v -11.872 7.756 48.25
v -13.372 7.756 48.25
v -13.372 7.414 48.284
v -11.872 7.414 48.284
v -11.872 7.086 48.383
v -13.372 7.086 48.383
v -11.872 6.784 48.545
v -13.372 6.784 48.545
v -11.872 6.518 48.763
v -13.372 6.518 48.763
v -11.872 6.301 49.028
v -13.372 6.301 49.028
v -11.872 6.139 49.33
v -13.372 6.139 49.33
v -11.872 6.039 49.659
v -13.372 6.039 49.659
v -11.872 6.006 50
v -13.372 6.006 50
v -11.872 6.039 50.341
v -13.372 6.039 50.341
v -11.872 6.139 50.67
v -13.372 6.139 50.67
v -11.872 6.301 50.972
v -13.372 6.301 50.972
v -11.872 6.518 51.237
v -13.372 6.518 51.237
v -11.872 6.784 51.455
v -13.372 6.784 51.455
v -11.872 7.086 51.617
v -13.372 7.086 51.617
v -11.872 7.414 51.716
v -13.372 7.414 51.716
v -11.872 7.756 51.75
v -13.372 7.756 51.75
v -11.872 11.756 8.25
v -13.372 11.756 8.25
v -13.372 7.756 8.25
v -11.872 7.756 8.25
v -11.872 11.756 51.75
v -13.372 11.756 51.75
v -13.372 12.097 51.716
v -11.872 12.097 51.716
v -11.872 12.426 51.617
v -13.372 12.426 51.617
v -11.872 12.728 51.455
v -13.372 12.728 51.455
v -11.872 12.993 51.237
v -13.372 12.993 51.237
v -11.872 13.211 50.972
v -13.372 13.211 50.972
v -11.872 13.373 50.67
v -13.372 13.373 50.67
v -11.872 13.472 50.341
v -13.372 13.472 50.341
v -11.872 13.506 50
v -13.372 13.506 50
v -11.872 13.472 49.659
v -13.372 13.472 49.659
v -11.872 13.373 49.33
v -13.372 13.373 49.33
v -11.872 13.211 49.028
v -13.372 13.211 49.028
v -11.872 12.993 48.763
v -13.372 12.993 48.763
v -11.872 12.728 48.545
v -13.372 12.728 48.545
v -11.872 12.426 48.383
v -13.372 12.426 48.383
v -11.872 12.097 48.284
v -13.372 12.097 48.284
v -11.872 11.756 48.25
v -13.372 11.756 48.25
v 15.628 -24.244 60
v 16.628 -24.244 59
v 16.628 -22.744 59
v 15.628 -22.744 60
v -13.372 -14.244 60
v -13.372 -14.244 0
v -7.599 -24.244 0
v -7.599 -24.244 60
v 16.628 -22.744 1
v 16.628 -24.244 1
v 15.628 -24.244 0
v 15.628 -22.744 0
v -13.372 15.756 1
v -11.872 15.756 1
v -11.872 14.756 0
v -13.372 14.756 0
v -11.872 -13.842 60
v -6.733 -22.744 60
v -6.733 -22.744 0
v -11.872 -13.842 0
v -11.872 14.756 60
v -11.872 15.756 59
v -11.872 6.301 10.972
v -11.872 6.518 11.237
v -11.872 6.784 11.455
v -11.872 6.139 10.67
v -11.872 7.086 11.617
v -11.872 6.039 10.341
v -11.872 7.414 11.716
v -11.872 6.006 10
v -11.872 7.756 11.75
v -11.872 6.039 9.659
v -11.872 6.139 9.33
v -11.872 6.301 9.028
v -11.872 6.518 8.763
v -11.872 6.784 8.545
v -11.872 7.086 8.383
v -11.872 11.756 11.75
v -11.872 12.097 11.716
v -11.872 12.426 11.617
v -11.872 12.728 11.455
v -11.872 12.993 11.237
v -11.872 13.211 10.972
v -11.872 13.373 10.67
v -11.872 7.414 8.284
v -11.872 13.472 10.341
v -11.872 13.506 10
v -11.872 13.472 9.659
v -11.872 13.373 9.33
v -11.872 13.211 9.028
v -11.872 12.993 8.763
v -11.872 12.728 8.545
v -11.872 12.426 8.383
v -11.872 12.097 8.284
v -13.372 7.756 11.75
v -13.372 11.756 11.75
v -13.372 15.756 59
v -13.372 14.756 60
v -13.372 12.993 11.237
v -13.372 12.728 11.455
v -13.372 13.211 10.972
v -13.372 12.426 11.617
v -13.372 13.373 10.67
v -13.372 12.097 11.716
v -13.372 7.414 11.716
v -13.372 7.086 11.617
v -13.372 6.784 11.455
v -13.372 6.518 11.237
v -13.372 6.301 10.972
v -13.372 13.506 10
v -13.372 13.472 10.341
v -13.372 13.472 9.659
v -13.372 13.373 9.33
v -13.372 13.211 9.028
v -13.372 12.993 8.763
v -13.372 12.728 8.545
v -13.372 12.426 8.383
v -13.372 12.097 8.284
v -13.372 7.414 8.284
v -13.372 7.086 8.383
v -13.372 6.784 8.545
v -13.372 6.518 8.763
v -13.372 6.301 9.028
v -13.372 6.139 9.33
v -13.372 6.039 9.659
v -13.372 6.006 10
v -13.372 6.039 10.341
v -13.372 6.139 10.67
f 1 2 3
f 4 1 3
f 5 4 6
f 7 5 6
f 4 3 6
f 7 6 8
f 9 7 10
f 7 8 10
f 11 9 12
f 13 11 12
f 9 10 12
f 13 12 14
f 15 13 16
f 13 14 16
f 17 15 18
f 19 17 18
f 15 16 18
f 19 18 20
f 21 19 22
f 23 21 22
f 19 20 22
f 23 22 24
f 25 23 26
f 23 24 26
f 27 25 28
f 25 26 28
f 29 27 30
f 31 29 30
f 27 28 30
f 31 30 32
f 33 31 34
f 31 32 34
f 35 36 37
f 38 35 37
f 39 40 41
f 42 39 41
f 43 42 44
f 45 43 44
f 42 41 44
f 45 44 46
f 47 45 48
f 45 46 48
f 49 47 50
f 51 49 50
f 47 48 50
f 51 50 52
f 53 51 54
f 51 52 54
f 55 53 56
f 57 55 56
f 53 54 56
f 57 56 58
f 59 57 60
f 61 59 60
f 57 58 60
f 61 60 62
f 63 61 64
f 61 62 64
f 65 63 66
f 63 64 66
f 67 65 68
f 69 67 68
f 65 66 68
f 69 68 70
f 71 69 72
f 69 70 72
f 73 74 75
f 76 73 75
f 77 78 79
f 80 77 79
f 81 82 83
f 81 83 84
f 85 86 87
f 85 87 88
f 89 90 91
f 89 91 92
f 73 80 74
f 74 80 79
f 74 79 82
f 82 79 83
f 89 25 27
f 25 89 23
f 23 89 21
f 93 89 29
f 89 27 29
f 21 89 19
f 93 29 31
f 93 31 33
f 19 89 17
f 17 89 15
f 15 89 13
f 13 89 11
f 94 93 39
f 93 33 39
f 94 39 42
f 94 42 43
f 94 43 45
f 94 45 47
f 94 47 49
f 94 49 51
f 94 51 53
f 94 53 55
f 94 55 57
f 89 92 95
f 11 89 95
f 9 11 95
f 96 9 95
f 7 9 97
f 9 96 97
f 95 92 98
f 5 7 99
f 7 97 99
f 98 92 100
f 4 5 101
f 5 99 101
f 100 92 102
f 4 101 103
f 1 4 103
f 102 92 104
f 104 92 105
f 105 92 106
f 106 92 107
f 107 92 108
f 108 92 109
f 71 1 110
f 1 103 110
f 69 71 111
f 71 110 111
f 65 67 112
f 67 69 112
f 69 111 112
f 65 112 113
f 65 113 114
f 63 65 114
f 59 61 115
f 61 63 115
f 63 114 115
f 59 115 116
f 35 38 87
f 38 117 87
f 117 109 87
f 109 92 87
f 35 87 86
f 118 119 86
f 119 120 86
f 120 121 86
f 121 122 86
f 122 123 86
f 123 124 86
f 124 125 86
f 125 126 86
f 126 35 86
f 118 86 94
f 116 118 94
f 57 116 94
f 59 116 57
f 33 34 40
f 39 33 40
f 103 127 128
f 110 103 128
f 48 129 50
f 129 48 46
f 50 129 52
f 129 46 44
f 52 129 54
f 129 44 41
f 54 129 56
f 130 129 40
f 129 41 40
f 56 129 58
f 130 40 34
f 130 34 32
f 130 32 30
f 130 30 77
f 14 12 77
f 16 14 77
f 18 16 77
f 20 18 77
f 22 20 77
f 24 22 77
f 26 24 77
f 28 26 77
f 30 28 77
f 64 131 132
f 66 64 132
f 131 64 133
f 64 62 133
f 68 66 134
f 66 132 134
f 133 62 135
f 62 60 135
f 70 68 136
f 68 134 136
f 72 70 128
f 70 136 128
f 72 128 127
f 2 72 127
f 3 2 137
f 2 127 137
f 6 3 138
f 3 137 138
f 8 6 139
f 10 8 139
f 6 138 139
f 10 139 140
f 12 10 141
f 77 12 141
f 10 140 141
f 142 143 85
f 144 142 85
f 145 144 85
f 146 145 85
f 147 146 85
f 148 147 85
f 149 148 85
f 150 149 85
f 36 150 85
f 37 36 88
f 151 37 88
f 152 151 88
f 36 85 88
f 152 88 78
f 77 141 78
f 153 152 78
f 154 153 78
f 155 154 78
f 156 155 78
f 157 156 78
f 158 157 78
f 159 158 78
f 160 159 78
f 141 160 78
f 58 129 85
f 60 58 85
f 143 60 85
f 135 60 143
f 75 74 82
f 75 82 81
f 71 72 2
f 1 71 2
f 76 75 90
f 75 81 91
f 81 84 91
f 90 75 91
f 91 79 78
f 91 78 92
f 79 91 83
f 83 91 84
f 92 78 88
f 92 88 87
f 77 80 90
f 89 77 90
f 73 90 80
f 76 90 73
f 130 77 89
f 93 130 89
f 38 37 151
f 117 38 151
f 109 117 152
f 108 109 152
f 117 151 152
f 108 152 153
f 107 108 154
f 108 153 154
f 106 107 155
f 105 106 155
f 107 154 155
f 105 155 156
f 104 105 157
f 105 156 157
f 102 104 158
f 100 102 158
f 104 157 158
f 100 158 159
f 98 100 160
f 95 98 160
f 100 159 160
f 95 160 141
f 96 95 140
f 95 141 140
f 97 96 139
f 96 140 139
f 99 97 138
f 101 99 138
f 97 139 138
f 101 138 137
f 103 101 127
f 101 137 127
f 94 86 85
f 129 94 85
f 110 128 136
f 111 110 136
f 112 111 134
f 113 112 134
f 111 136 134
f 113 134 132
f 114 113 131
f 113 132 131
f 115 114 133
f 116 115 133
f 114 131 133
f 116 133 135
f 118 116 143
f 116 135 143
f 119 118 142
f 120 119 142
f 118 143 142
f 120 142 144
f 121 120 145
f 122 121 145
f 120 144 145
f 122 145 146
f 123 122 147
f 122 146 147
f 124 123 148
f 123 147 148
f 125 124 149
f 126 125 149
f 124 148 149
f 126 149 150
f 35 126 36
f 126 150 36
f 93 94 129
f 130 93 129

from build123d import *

# Parameters (mm, degrees)
BOSS_EXTRUDE1_DEPTH = 60
CUT_EXTRUDE1_DEPTH  = 60
CHAMFER1_SIZE       = 1


with BuildPart() as part:
    # Sketch1 → Boss-Extrude1 (new body)
    with BuildSketch(Plane.XY):
        Polygon((-13.372093023, -14.244186047), (-7.598590331, -24.244186047), (16.627906977, -24.244186047), (16.627906977, -22.744186047), (-6.732564928, -22.744186047), (-11.872093023, -13.842262258), (-11.872093023, 15.755813953), (-13.372093023, 15.755813953), align=None)
    extrude(amount=BOSS_EXTRUDE1_DEPTH)

    # Sketch3 → Cut-Extrude1 (cut)
    with BuildSketch(Plane.ZY.offset(13.372093023)):
        with BuildLine():
            Line((8.25, 11.755813953), (8.25, 7.755813953))
            ThreePointArc((8.25, 7.755813953), (10, 6.005813953), (11.75, 7.755813953))
            Line((11.75, 7.755813953), (11.75, 11.755813953))
            ThreePointArc((11.75, 11.755813953), (10, 13.505813953), (8.25, 11.755813953))
        make_face()
        with BuildLine():
            Line((48.25, 11.755813953), (48.25, 7.755813953))
            ThreePointArc((48.25, 7.755813953), (50, 6.005813953), (51.75, 7.755813953))
            Line((51.75, 7.755813953), (51.75, 11.755813953))
            ThreePointArc((51.75, 11.755813953), (50, 13.505813953), (48.25, 11.755813953))
        make_face()
    extrude(amount=-CUT_EXTRUDE1_DEPTH, mode=Mode.SUBTRACT)

    # Chamfer1
    chamfer1_edges = [part.edges().sort_by_distance(p)[0] for p in [
        (16.627906977, -23.494186047, 60),
        (-12.622093023, 15.755813953, 60),
        (-12.622093023, 15.755813953, 0),
        (16.627906977, -23.494186047, 0),
    ]]
    chamfer(chamfer1_edges, length=CHAMFER1_SIZE)


solid = part.part
